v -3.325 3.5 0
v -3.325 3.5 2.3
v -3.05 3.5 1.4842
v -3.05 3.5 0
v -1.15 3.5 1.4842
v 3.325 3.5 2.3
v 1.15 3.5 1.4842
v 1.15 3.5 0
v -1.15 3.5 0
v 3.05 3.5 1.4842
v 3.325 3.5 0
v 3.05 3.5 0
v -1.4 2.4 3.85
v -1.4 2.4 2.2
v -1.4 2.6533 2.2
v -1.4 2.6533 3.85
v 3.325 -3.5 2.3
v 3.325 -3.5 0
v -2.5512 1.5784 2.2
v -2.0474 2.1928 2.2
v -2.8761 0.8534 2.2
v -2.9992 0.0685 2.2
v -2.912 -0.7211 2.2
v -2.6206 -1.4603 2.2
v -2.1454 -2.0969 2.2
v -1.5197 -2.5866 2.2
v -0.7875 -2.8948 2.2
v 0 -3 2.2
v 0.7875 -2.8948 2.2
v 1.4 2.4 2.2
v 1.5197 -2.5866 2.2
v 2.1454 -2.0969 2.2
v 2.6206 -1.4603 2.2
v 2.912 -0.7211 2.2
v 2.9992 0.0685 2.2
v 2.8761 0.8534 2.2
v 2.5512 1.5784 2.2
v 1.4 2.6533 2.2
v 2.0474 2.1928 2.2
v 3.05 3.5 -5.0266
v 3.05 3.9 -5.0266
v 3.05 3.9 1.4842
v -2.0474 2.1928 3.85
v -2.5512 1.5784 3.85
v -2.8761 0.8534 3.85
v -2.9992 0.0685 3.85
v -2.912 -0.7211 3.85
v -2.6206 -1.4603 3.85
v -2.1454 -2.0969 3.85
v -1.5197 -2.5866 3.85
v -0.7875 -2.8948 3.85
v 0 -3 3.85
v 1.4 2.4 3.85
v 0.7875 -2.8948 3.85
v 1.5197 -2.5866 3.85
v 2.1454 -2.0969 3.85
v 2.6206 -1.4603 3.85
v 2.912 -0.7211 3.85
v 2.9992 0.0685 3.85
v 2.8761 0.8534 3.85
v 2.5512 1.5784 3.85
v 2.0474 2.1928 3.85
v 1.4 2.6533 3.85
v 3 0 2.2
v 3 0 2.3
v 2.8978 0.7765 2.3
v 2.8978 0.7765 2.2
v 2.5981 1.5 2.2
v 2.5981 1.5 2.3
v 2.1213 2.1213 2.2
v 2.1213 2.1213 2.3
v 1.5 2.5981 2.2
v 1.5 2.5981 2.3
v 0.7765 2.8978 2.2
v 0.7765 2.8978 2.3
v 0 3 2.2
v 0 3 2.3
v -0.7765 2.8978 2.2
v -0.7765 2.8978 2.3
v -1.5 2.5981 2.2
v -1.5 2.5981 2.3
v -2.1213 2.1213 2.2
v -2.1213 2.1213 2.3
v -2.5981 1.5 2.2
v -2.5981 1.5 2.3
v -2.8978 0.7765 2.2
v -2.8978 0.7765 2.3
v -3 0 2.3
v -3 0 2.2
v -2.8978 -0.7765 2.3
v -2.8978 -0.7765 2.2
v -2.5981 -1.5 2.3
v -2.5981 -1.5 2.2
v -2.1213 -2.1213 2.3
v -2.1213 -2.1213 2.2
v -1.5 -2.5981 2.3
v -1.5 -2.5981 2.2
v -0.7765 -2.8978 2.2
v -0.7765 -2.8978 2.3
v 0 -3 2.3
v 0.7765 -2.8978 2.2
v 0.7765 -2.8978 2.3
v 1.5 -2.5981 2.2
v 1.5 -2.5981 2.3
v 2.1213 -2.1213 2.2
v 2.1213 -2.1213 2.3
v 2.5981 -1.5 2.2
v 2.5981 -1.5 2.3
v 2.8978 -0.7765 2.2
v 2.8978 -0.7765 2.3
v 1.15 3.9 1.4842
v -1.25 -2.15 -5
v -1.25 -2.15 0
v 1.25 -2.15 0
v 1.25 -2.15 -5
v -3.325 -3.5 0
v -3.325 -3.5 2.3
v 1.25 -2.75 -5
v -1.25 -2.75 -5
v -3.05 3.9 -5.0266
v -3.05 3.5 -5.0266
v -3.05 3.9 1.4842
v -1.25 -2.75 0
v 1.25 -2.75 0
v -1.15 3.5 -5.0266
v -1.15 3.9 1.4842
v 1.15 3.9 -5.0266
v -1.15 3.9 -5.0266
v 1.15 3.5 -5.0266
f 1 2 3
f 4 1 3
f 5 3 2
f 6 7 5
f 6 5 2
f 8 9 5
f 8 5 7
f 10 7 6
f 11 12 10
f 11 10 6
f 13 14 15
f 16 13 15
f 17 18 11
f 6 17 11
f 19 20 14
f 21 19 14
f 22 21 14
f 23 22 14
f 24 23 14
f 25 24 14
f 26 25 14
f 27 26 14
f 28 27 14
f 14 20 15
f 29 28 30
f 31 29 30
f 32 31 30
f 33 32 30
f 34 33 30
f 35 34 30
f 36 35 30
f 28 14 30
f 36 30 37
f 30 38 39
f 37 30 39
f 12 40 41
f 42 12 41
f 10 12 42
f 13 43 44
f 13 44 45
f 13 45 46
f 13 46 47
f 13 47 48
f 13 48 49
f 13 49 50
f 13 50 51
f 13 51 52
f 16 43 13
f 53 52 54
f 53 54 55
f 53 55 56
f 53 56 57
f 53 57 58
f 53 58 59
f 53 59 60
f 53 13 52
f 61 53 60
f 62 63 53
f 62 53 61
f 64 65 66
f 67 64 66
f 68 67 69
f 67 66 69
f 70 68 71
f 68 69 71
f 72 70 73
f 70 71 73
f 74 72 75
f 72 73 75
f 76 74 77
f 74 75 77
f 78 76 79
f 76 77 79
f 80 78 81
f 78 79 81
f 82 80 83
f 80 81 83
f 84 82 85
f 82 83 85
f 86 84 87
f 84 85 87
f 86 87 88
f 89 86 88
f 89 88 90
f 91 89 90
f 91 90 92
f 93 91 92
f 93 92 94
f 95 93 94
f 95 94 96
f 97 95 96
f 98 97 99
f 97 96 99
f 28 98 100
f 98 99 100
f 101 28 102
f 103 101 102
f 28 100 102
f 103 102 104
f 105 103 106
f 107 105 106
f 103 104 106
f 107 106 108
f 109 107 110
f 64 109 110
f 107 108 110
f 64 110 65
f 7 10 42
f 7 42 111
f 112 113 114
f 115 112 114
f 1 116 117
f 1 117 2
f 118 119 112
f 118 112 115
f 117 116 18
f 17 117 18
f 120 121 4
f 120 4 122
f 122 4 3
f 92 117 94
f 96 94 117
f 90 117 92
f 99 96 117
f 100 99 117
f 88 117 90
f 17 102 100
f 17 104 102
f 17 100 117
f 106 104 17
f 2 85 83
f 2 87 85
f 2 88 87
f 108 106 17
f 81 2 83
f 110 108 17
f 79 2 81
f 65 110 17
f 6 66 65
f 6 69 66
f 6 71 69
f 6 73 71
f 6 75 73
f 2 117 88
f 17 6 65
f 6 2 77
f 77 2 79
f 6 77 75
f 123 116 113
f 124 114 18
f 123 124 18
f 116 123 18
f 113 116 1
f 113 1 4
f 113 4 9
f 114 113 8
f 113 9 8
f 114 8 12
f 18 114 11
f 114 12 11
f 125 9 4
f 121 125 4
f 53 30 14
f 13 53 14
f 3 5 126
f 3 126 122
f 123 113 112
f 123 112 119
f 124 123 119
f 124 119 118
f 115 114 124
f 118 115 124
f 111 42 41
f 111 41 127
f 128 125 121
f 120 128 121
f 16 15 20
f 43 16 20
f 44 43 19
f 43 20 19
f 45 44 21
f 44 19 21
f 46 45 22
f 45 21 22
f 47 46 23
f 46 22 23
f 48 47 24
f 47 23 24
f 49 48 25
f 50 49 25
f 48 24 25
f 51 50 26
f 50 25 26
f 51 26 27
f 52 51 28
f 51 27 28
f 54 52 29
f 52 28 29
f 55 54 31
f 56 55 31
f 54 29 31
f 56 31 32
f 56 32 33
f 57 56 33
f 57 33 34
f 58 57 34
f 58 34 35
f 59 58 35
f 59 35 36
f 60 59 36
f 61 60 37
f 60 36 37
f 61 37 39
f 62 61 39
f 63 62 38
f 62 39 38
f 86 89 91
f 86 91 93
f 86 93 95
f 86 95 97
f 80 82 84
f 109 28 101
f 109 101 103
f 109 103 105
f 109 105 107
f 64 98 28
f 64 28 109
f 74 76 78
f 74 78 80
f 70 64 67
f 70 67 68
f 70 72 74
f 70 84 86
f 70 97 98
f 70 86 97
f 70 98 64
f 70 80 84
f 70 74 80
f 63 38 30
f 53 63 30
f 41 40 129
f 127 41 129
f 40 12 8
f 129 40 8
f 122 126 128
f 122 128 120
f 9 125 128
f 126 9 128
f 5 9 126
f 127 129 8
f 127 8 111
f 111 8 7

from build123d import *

# Parameters (mm, degrees)
F0_W     = 6.65
F0_H     = 7
F1_DEPTH = 2.3
F2_R     = 3
F3_DEPTH = 0.1
F4_W     = 2.5
F4_H     = 0.6
F5_DEPTH = 5
F6_W     = 1.9
F6_H     = 6.510749
F7_DEPTH = 0.4
F9_DEPTH = 1.65


with BuildPart() as f1:
    # F0 (on Top) → F1 (new body)
    with BuildSketch(Plane.XY):
        Rectangle(F0_W, F0_H)
    extrude(amount=F1_DEPTH)

    # F2 (on face) → F3 (cut)
    with BuildSketch(Plane.XY.offset(2.3)):
        Circle(F2_R)
    extrude(amount=-F3_DEPTH, mode=Mode.SUBTRACT)

    # F4 (on face) → F5 (join)
    with BuildSketch(Plane(origin=(0, 0, 0), x_dir=(1, 0, 0), z_dir=(0, 0, -1))):
        with Locations((0, 2.45)):
            Rectangle(F4_W, F4_H)
    extrude(amount=F5_DEPTH)

    # F6 (on face) → F7 (join)
    with BuildSketch(Plane(origin=(0, 3.5, 0), x_dir=(-1, 0, 0), z_dir=(0, 1, 0))):
        with Locations((2.1, -1.771215)):
            Rectangle(F6_W, F6_H)
        with Locations((-2.1, -1.771215)):
            Rectangle(F6_W, F6_H)
    extrude(amount=F7_DEPTH)


with BuildPart() as f9:
    # F8 (on face) → F9 (new body)
    with BuildSketch(Plane.XY.offset(2.2)):
        with BuildLine():
            Line((-1.4, 2.4), (-1.4, 2.6533))
            ThreePointArc((-1.4, 2.6533), (0, -3), (1.4, 2.6533))
            Line((1.4, 2.6533), (1.4, 2.4))
            Line((1.4, 2.4), (-1.4, 2.4))
        make_face()
    extrude(amount=F9_DEPTH)


solid = Compound([f1.part, f9.part])
